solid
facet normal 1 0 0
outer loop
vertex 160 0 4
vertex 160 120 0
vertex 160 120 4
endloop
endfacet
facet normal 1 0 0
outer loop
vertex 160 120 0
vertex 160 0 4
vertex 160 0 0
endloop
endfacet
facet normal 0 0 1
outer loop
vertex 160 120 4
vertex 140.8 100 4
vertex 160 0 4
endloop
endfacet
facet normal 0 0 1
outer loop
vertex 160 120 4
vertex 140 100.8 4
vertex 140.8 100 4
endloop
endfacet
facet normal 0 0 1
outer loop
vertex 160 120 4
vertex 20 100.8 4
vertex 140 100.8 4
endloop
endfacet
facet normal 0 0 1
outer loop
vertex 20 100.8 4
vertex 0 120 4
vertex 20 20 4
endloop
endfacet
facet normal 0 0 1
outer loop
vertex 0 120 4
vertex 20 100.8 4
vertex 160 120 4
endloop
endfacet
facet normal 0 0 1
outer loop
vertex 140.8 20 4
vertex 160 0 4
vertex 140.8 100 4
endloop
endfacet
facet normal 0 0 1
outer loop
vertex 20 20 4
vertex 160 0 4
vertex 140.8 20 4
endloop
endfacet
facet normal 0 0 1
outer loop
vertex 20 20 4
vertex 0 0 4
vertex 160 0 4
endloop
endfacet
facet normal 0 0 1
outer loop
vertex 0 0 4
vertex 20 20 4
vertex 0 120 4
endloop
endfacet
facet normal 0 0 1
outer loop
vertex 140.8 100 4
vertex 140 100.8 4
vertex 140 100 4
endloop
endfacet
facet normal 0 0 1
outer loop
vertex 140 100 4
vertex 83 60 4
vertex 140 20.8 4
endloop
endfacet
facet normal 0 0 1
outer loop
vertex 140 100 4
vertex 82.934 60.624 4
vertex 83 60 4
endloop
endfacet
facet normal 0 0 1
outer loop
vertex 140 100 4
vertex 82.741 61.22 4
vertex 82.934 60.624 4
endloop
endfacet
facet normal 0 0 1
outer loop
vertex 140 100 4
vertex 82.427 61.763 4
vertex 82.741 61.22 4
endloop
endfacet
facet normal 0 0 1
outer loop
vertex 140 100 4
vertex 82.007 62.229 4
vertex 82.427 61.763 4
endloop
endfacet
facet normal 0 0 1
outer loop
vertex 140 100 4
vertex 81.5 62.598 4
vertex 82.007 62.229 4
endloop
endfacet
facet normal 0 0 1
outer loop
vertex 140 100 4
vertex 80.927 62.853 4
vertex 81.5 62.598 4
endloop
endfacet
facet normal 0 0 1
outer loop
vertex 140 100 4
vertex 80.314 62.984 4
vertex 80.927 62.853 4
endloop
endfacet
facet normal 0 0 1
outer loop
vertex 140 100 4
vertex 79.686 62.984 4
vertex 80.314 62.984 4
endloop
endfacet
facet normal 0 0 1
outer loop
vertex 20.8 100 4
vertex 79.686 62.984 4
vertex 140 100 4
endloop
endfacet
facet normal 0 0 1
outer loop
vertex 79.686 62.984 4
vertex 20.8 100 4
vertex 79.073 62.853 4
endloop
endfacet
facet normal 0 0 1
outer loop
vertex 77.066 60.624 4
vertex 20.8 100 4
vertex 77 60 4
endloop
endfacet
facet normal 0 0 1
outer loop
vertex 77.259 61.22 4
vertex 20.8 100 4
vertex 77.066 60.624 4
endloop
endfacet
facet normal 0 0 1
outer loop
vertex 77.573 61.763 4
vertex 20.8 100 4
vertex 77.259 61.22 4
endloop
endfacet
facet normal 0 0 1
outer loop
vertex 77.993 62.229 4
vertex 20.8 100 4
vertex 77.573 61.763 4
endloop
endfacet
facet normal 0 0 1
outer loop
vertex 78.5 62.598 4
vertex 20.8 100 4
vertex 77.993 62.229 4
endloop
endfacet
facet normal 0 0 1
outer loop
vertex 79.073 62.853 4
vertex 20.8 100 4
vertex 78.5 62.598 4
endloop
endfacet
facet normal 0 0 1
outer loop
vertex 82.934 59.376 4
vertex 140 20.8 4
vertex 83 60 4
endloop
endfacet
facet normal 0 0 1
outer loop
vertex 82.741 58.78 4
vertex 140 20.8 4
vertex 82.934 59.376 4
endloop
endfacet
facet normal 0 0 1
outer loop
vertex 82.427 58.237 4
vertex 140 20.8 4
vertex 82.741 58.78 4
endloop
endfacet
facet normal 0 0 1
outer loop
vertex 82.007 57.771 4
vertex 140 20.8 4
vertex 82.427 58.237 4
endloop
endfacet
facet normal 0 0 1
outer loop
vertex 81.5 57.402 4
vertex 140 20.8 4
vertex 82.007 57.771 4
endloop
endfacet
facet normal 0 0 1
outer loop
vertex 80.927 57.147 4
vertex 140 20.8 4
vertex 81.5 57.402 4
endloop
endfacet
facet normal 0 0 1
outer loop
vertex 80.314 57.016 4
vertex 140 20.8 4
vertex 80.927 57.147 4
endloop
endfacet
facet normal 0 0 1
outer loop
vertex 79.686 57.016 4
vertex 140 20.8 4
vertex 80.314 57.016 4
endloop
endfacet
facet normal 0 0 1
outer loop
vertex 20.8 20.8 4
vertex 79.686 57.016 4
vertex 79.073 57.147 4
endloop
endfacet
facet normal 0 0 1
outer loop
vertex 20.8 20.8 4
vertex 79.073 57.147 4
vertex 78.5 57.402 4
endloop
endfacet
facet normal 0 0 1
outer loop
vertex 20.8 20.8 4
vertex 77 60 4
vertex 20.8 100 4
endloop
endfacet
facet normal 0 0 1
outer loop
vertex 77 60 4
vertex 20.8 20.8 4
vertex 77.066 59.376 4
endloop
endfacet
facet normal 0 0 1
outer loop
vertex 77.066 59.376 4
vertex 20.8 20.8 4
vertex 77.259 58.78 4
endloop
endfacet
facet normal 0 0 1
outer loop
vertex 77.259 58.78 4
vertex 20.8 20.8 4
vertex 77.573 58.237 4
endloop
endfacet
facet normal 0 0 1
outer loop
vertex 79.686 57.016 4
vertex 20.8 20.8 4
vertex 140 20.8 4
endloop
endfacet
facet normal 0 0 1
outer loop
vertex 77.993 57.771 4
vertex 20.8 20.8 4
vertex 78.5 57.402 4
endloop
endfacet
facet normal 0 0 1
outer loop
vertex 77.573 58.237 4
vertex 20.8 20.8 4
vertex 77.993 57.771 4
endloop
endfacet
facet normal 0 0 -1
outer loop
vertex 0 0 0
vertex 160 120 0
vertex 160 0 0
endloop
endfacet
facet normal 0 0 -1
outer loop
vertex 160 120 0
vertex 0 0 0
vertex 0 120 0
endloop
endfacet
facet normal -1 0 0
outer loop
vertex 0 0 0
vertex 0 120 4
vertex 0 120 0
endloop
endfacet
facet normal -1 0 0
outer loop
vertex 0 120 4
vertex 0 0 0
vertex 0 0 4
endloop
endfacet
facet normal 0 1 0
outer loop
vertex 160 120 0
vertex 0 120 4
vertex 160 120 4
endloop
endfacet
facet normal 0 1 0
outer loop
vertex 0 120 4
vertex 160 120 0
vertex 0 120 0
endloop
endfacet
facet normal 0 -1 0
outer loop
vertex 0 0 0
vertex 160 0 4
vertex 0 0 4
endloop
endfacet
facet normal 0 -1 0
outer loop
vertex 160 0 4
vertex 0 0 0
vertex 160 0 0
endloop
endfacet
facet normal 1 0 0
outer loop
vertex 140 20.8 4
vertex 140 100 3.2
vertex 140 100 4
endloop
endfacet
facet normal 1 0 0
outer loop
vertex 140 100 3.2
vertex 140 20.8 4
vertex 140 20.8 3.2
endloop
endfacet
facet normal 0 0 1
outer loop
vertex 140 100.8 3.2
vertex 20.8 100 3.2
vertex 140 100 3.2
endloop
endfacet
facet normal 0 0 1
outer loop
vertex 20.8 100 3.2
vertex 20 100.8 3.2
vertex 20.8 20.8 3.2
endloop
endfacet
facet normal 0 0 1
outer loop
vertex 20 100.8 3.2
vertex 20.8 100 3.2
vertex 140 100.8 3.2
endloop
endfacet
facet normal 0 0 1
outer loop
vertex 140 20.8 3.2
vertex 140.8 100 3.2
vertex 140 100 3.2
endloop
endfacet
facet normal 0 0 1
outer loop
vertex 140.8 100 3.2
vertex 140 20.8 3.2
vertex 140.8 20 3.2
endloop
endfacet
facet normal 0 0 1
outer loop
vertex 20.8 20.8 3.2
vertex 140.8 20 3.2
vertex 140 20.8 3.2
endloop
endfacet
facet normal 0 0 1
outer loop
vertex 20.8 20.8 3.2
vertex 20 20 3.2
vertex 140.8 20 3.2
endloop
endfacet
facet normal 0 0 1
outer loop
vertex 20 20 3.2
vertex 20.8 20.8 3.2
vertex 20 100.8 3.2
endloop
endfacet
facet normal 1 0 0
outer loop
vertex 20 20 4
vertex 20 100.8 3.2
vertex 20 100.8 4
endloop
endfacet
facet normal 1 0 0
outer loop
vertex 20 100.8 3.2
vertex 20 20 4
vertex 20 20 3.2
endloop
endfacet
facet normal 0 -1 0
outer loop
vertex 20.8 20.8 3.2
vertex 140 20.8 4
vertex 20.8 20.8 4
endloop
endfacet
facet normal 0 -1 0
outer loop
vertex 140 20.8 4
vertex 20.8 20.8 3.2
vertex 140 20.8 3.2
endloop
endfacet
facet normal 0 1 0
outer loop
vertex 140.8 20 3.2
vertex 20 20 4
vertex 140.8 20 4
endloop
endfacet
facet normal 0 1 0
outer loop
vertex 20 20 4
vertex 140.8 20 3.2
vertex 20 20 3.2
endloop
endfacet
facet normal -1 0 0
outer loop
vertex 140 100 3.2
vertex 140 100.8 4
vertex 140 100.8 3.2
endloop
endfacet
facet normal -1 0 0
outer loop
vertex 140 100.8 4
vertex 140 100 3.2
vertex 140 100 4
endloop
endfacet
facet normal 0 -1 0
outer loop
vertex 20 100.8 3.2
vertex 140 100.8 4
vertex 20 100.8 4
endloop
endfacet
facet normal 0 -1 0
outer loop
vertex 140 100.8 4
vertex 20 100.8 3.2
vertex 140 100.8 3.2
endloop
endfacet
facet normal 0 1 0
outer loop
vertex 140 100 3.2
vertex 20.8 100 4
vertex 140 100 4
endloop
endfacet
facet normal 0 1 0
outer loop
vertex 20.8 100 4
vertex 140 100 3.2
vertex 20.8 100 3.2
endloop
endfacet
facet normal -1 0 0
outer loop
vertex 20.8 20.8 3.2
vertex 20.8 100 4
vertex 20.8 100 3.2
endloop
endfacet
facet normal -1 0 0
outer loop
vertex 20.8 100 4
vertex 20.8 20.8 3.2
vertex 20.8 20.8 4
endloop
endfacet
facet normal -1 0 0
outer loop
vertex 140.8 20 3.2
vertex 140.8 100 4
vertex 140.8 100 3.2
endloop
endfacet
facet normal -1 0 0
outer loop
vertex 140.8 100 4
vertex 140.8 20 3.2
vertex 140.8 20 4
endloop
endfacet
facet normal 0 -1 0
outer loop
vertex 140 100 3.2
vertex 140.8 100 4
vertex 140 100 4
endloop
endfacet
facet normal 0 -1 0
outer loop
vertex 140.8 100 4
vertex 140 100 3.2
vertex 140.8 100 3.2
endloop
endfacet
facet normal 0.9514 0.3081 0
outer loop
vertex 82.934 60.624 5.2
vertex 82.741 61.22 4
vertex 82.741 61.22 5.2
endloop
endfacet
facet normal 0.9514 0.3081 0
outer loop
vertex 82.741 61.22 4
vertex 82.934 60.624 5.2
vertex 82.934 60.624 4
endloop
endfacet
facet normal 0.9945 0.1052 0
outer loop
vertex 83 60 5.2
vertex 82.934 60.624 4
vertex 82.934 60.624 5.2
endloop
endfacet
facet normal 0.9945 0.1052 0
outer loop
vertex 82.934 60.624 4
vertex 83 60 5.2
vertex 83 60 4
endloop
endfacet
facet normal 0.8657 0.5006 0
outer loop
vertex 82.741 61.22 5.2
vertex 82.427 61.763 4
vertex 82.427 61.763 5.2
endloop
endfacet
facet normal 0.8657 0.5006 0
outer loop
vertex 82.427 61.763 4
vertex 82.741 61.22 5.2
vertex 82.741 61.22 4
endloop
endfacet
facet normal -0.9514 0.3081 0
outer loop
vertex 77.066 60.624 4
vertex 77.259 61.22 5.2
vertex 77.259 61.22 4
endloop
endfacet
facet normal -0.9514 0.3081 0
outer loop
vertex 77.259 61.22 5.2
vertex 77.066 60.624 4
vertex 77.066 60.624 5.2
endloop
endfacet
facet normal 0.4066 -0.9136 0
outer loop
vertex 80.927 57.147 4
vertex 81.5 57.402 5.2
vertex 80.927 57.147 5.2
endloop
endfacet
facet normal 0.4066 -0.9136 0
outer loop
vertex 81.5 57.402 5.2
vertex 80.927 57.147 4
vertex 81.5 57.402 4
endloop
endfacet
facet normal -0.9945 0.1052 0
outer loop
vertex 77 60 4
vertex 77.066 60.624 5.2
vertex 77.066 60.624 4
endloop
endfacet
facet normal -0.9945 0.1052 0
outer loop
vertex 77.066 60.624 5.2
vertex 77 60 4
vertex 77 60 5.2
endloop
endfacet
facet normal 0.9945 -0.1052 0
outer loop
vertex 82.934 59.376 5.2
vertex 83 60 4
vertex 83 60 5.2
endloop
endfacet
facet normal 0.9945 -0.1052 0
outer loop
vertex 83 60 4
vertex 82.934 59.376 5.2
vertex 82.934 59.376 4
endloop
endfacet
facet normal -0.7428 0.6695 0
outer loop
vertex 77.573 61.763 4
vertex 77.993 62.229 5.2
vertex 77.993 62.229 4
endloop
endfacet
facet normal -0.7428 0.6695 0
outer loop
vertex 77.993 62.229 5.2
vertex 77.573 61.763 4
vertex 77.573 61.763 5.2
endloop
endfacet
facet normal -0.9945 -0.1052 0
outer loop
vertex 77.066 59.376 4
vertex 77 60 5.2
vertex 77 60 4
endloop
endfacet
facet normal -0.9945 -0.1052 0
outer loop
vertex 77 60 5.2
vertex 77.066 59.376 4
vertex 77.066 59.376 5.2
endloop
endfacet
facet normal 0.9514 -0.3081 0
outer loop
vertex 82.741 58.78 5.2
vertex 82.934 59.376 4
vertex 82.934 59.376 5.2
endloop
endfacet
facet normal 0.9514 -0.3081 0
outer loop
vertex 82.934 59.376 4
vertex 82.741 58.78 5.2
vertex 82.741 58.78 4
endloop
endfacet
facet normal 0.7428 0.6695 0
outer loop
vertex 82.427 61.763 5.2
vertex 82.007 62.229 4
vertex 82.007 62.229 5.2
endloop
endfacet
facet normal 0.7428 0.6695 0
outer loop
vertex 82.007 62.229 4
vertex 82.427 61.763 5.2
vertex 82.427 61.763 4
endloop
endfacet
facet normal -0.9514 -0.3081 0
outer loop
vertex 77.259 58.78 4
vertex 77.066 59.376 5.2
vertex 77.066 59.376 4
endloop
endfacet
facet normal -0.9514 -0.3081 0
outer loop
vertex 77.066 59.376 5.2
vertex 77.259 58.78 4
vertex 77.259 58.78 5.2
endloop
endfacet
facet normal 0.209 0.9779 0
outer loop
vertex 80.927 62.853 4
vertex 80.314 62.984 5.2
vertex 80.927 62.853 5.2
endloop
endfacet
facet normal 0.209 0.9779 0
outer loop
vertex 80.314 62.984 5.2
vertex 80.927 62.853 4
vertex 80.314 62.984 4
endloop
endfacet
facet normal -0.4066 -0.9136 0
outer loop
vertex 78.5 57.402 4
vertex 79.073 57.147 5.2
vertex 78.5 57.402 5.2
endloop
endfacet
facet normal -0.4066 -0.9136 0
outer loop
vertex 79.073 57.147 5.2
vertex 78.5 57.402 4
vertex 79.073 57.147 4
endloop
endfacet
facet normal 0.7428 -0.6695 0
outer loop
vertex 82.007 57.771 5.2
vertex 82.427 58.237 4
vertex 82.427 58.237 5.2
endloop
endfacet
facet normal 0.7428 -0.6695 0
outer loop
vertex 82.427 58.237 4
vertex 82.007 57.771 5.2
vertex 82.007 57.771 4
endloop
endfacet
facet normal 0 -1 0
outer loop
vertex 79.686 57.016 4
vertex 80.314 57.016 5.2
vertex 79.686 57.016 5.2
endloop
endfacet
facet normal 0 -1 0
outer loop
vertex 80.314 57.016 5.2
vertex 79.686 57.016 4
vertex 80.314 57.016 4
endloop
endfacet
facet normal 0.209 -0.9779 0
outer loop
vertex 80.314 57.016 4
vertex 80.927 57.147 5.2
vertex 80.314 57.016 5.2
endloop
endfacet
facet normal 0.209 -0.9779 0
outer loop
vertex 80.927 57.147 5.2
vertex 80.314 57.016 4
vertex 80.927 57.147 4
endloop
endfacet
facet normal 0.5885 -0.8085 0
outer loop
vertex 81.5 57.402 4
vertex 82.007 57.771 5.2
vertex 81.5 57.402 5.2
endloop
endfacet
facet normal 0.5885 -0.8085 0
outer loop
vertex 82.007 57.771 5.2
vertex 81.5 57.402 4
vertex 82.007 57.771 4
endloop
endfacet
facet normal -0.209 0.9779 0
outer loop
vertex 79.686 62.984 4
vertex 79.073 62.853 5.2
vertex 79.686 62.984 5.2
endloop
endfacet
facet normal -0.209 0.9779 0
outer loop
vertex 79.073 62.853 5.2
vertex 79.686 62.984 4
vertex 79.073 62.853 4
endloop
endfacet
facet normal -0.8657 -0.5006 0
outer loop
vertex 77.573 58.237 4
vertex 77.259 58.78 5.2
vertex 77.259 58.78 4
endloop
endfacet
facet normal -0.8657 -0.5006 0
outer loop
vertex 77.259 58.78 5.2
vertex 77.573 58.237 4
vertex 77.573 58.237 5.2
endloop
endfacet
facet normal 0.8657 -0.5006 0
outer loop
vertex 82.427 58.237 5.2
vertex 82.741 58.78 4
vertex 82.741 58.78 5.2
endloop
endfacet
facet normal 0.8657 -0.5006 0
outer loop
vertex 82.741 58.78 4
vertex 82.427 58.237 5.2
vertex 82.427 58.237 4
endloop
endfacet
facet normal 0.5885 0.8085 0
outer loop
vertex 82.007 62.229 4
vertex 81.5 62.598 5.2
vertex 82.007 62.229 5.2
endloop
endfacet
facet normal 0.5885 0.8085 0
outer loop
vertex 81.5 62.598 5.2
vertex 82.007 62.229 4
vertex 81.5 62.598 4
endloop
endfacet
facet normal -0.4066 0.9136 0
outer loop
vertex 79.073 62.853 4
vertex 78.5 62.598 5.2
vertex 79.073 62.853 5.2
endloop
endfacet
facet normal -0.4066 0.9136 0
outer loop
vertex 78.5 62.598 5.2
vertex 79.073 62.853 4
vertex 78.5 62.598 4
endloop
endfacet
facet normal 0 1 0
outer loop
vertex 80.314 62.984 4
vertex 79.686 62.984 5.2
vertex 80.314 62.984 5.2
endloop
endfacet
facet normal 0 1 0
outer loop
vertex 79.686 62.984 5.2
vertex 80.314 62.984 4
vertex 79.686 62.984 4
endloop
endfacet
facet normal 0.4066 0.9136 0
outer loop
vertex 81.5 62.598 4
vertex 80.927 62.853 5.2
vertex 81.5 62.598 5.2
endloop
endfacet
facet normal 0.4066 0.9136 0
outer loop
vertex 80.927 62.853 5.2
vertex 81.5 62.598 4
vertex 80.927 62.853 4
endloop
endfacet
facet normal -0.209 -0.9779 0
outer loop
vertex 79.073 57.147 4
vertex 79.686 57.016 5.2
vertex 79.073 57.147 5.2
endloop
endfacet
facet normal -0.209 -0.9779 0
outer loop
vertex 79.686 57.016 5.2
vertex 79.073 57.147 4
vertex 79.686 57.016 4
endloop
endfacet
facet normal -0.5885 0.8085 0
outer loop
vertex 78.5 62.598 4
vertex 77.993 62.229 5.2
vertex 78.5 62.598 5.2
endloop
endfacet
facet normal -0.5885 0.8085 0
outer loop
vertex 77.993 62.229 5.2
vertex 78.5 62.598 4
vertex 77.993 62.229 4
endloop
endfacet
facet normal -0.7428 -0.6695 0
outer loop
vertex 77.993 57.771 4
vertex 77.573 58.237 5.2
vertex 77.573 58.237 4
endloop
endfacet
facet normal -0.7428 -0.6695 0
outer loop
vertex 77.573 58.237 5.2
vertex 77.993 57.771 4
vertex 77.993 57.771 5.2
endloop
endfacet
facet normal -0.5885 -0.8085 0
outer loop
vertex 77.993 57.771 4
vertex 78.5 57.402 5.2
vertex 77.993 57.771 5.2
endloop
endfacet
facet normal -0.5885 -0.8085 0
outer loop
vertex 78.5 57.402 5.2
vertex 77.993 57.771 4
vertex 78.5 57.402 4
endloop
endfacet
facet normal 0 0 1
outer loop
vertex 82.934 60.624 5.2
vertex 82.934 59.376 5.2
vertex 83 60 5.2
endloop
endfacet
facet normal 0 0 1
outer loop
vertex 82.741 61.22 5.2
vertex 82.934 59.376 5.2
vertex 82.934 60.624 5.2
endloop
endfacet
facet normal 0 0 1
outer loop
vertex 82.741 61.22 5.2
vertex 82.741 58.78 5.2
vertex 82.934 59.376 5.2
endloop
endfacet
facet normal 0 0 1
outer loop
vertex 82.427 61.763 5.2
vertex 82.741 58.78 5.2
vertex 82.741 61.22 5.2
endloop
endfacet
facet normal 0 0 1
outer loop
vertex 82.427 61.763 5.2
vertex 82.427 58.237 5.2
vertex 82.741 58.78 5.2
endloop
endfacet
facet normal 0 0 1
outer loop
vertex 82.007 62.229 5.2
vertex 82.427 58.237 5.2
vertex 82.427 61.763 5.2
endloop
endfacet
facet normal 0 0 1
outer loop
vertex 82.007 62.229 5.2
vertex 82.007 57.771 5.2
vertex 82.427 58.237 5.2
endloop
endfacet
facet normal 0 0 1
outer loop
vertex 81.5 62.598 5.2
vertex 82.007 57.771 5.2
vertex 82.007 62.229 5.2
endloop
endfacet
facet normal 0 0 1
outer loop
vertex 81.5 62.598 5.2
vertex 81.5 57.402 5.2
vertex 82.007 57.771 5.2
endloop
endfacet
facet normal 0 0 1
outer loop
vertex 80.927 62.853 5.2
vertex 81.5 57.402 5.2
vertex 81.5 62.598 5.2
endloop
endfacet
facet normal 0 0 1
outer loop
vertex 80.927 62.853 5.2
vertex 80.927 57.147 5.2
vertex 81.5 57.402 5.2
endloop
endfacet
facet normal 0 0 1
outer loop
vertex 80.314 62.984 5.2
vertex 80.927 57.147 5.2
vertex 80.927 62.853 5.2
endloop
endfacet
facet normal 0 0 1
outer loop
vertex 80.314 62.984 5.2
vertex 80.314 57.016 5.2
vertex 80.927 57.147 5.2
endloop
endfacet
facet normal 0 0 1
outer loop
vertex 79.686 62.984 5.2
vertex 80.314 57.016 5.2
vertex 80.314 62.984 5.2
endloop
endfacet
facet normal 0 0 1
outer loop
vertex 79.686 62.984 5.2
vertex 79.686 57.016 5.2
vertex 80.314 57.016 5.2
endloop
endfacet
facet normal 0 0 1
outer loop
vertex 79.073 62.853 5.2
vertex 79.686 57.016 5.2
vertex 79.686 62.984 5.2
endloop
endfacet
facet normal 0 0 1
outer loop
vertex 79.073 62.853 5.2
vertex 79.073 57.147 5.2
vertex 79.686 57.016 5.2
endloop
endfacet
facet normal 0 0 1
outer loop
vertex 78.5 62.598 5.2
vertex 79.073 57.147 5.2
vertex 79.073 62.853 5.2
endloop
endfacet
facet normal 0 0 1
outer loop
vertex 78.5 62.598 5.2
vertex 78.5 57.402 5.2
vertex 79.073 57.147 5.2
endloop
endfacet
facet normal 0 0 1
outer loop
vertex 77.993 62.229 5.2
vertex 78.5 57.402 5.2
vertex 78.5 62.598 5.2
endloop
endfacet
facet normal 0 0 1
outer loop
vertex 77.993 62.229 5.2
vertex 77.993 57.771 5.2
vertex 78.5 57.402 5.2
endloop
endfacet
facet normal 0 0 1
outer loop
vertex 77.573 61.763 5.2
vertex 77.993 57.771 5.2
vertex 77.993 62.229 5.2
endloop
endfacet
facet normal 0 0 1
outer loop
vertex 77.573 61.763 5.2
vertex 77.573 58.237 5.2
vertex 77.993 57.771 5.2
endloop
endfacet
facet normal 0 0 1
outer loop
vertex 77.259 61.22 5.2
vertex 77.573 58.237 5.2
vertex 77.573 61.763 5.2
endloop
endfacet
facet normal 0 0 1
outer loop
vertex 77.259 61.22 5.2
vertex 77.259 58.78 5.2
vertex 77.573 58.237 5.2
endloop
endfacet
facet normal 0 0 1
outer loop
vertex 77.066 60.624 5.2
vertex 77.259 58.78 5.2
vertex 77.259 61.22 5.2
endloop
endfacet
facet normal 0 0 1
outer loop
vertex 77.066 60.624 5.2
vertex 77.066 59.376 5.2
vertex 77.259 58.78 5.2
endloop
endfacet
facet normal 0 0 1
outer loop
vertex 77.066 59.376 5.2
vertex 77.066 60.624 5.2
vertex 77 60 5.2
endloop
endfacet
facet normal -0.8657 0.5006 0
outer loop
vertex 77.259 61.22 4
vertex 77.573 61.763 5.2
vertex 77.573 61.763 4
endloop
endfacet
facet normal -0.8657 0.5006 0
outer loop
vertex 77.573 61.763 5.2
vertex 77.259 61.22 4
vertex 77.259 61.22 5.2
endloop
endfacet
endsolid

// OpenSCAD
/*
Title: Robot Stability COM Board
Folder: 17_robotics_applications
Physics Topic: Tipping stability and COM envelope
Difficulty: Beginner-Intermediate
Print Type: FDM, single material
Teaches: Conceptual mechanics
Use Case: Classroom manipulative
*/


// --------------------
// Parameters
// --------------------
base_w = 160;
base_h = 120;
thickness = 4;

module stability_board(){
    difference(){
        cube([base_w,base_h,thickness]);
        // wheelbase and tipping-edge markers
        translate([20,20,thickness-0.8]) cube([120,0.8,1]);
        translate([20,100,thickness-0.8]) cube([120,0.8,1]);
        translate([20,20,thickness-0.8]) cube([0.8,80,1]);
        translate([140,20,thickness-0.8]) cube([0.8,80,1]);
    }
    translate([80,60,thickness]) cylinder(h=1.2,d=6,$fn=30); // nominal COM
}
stability_board();
